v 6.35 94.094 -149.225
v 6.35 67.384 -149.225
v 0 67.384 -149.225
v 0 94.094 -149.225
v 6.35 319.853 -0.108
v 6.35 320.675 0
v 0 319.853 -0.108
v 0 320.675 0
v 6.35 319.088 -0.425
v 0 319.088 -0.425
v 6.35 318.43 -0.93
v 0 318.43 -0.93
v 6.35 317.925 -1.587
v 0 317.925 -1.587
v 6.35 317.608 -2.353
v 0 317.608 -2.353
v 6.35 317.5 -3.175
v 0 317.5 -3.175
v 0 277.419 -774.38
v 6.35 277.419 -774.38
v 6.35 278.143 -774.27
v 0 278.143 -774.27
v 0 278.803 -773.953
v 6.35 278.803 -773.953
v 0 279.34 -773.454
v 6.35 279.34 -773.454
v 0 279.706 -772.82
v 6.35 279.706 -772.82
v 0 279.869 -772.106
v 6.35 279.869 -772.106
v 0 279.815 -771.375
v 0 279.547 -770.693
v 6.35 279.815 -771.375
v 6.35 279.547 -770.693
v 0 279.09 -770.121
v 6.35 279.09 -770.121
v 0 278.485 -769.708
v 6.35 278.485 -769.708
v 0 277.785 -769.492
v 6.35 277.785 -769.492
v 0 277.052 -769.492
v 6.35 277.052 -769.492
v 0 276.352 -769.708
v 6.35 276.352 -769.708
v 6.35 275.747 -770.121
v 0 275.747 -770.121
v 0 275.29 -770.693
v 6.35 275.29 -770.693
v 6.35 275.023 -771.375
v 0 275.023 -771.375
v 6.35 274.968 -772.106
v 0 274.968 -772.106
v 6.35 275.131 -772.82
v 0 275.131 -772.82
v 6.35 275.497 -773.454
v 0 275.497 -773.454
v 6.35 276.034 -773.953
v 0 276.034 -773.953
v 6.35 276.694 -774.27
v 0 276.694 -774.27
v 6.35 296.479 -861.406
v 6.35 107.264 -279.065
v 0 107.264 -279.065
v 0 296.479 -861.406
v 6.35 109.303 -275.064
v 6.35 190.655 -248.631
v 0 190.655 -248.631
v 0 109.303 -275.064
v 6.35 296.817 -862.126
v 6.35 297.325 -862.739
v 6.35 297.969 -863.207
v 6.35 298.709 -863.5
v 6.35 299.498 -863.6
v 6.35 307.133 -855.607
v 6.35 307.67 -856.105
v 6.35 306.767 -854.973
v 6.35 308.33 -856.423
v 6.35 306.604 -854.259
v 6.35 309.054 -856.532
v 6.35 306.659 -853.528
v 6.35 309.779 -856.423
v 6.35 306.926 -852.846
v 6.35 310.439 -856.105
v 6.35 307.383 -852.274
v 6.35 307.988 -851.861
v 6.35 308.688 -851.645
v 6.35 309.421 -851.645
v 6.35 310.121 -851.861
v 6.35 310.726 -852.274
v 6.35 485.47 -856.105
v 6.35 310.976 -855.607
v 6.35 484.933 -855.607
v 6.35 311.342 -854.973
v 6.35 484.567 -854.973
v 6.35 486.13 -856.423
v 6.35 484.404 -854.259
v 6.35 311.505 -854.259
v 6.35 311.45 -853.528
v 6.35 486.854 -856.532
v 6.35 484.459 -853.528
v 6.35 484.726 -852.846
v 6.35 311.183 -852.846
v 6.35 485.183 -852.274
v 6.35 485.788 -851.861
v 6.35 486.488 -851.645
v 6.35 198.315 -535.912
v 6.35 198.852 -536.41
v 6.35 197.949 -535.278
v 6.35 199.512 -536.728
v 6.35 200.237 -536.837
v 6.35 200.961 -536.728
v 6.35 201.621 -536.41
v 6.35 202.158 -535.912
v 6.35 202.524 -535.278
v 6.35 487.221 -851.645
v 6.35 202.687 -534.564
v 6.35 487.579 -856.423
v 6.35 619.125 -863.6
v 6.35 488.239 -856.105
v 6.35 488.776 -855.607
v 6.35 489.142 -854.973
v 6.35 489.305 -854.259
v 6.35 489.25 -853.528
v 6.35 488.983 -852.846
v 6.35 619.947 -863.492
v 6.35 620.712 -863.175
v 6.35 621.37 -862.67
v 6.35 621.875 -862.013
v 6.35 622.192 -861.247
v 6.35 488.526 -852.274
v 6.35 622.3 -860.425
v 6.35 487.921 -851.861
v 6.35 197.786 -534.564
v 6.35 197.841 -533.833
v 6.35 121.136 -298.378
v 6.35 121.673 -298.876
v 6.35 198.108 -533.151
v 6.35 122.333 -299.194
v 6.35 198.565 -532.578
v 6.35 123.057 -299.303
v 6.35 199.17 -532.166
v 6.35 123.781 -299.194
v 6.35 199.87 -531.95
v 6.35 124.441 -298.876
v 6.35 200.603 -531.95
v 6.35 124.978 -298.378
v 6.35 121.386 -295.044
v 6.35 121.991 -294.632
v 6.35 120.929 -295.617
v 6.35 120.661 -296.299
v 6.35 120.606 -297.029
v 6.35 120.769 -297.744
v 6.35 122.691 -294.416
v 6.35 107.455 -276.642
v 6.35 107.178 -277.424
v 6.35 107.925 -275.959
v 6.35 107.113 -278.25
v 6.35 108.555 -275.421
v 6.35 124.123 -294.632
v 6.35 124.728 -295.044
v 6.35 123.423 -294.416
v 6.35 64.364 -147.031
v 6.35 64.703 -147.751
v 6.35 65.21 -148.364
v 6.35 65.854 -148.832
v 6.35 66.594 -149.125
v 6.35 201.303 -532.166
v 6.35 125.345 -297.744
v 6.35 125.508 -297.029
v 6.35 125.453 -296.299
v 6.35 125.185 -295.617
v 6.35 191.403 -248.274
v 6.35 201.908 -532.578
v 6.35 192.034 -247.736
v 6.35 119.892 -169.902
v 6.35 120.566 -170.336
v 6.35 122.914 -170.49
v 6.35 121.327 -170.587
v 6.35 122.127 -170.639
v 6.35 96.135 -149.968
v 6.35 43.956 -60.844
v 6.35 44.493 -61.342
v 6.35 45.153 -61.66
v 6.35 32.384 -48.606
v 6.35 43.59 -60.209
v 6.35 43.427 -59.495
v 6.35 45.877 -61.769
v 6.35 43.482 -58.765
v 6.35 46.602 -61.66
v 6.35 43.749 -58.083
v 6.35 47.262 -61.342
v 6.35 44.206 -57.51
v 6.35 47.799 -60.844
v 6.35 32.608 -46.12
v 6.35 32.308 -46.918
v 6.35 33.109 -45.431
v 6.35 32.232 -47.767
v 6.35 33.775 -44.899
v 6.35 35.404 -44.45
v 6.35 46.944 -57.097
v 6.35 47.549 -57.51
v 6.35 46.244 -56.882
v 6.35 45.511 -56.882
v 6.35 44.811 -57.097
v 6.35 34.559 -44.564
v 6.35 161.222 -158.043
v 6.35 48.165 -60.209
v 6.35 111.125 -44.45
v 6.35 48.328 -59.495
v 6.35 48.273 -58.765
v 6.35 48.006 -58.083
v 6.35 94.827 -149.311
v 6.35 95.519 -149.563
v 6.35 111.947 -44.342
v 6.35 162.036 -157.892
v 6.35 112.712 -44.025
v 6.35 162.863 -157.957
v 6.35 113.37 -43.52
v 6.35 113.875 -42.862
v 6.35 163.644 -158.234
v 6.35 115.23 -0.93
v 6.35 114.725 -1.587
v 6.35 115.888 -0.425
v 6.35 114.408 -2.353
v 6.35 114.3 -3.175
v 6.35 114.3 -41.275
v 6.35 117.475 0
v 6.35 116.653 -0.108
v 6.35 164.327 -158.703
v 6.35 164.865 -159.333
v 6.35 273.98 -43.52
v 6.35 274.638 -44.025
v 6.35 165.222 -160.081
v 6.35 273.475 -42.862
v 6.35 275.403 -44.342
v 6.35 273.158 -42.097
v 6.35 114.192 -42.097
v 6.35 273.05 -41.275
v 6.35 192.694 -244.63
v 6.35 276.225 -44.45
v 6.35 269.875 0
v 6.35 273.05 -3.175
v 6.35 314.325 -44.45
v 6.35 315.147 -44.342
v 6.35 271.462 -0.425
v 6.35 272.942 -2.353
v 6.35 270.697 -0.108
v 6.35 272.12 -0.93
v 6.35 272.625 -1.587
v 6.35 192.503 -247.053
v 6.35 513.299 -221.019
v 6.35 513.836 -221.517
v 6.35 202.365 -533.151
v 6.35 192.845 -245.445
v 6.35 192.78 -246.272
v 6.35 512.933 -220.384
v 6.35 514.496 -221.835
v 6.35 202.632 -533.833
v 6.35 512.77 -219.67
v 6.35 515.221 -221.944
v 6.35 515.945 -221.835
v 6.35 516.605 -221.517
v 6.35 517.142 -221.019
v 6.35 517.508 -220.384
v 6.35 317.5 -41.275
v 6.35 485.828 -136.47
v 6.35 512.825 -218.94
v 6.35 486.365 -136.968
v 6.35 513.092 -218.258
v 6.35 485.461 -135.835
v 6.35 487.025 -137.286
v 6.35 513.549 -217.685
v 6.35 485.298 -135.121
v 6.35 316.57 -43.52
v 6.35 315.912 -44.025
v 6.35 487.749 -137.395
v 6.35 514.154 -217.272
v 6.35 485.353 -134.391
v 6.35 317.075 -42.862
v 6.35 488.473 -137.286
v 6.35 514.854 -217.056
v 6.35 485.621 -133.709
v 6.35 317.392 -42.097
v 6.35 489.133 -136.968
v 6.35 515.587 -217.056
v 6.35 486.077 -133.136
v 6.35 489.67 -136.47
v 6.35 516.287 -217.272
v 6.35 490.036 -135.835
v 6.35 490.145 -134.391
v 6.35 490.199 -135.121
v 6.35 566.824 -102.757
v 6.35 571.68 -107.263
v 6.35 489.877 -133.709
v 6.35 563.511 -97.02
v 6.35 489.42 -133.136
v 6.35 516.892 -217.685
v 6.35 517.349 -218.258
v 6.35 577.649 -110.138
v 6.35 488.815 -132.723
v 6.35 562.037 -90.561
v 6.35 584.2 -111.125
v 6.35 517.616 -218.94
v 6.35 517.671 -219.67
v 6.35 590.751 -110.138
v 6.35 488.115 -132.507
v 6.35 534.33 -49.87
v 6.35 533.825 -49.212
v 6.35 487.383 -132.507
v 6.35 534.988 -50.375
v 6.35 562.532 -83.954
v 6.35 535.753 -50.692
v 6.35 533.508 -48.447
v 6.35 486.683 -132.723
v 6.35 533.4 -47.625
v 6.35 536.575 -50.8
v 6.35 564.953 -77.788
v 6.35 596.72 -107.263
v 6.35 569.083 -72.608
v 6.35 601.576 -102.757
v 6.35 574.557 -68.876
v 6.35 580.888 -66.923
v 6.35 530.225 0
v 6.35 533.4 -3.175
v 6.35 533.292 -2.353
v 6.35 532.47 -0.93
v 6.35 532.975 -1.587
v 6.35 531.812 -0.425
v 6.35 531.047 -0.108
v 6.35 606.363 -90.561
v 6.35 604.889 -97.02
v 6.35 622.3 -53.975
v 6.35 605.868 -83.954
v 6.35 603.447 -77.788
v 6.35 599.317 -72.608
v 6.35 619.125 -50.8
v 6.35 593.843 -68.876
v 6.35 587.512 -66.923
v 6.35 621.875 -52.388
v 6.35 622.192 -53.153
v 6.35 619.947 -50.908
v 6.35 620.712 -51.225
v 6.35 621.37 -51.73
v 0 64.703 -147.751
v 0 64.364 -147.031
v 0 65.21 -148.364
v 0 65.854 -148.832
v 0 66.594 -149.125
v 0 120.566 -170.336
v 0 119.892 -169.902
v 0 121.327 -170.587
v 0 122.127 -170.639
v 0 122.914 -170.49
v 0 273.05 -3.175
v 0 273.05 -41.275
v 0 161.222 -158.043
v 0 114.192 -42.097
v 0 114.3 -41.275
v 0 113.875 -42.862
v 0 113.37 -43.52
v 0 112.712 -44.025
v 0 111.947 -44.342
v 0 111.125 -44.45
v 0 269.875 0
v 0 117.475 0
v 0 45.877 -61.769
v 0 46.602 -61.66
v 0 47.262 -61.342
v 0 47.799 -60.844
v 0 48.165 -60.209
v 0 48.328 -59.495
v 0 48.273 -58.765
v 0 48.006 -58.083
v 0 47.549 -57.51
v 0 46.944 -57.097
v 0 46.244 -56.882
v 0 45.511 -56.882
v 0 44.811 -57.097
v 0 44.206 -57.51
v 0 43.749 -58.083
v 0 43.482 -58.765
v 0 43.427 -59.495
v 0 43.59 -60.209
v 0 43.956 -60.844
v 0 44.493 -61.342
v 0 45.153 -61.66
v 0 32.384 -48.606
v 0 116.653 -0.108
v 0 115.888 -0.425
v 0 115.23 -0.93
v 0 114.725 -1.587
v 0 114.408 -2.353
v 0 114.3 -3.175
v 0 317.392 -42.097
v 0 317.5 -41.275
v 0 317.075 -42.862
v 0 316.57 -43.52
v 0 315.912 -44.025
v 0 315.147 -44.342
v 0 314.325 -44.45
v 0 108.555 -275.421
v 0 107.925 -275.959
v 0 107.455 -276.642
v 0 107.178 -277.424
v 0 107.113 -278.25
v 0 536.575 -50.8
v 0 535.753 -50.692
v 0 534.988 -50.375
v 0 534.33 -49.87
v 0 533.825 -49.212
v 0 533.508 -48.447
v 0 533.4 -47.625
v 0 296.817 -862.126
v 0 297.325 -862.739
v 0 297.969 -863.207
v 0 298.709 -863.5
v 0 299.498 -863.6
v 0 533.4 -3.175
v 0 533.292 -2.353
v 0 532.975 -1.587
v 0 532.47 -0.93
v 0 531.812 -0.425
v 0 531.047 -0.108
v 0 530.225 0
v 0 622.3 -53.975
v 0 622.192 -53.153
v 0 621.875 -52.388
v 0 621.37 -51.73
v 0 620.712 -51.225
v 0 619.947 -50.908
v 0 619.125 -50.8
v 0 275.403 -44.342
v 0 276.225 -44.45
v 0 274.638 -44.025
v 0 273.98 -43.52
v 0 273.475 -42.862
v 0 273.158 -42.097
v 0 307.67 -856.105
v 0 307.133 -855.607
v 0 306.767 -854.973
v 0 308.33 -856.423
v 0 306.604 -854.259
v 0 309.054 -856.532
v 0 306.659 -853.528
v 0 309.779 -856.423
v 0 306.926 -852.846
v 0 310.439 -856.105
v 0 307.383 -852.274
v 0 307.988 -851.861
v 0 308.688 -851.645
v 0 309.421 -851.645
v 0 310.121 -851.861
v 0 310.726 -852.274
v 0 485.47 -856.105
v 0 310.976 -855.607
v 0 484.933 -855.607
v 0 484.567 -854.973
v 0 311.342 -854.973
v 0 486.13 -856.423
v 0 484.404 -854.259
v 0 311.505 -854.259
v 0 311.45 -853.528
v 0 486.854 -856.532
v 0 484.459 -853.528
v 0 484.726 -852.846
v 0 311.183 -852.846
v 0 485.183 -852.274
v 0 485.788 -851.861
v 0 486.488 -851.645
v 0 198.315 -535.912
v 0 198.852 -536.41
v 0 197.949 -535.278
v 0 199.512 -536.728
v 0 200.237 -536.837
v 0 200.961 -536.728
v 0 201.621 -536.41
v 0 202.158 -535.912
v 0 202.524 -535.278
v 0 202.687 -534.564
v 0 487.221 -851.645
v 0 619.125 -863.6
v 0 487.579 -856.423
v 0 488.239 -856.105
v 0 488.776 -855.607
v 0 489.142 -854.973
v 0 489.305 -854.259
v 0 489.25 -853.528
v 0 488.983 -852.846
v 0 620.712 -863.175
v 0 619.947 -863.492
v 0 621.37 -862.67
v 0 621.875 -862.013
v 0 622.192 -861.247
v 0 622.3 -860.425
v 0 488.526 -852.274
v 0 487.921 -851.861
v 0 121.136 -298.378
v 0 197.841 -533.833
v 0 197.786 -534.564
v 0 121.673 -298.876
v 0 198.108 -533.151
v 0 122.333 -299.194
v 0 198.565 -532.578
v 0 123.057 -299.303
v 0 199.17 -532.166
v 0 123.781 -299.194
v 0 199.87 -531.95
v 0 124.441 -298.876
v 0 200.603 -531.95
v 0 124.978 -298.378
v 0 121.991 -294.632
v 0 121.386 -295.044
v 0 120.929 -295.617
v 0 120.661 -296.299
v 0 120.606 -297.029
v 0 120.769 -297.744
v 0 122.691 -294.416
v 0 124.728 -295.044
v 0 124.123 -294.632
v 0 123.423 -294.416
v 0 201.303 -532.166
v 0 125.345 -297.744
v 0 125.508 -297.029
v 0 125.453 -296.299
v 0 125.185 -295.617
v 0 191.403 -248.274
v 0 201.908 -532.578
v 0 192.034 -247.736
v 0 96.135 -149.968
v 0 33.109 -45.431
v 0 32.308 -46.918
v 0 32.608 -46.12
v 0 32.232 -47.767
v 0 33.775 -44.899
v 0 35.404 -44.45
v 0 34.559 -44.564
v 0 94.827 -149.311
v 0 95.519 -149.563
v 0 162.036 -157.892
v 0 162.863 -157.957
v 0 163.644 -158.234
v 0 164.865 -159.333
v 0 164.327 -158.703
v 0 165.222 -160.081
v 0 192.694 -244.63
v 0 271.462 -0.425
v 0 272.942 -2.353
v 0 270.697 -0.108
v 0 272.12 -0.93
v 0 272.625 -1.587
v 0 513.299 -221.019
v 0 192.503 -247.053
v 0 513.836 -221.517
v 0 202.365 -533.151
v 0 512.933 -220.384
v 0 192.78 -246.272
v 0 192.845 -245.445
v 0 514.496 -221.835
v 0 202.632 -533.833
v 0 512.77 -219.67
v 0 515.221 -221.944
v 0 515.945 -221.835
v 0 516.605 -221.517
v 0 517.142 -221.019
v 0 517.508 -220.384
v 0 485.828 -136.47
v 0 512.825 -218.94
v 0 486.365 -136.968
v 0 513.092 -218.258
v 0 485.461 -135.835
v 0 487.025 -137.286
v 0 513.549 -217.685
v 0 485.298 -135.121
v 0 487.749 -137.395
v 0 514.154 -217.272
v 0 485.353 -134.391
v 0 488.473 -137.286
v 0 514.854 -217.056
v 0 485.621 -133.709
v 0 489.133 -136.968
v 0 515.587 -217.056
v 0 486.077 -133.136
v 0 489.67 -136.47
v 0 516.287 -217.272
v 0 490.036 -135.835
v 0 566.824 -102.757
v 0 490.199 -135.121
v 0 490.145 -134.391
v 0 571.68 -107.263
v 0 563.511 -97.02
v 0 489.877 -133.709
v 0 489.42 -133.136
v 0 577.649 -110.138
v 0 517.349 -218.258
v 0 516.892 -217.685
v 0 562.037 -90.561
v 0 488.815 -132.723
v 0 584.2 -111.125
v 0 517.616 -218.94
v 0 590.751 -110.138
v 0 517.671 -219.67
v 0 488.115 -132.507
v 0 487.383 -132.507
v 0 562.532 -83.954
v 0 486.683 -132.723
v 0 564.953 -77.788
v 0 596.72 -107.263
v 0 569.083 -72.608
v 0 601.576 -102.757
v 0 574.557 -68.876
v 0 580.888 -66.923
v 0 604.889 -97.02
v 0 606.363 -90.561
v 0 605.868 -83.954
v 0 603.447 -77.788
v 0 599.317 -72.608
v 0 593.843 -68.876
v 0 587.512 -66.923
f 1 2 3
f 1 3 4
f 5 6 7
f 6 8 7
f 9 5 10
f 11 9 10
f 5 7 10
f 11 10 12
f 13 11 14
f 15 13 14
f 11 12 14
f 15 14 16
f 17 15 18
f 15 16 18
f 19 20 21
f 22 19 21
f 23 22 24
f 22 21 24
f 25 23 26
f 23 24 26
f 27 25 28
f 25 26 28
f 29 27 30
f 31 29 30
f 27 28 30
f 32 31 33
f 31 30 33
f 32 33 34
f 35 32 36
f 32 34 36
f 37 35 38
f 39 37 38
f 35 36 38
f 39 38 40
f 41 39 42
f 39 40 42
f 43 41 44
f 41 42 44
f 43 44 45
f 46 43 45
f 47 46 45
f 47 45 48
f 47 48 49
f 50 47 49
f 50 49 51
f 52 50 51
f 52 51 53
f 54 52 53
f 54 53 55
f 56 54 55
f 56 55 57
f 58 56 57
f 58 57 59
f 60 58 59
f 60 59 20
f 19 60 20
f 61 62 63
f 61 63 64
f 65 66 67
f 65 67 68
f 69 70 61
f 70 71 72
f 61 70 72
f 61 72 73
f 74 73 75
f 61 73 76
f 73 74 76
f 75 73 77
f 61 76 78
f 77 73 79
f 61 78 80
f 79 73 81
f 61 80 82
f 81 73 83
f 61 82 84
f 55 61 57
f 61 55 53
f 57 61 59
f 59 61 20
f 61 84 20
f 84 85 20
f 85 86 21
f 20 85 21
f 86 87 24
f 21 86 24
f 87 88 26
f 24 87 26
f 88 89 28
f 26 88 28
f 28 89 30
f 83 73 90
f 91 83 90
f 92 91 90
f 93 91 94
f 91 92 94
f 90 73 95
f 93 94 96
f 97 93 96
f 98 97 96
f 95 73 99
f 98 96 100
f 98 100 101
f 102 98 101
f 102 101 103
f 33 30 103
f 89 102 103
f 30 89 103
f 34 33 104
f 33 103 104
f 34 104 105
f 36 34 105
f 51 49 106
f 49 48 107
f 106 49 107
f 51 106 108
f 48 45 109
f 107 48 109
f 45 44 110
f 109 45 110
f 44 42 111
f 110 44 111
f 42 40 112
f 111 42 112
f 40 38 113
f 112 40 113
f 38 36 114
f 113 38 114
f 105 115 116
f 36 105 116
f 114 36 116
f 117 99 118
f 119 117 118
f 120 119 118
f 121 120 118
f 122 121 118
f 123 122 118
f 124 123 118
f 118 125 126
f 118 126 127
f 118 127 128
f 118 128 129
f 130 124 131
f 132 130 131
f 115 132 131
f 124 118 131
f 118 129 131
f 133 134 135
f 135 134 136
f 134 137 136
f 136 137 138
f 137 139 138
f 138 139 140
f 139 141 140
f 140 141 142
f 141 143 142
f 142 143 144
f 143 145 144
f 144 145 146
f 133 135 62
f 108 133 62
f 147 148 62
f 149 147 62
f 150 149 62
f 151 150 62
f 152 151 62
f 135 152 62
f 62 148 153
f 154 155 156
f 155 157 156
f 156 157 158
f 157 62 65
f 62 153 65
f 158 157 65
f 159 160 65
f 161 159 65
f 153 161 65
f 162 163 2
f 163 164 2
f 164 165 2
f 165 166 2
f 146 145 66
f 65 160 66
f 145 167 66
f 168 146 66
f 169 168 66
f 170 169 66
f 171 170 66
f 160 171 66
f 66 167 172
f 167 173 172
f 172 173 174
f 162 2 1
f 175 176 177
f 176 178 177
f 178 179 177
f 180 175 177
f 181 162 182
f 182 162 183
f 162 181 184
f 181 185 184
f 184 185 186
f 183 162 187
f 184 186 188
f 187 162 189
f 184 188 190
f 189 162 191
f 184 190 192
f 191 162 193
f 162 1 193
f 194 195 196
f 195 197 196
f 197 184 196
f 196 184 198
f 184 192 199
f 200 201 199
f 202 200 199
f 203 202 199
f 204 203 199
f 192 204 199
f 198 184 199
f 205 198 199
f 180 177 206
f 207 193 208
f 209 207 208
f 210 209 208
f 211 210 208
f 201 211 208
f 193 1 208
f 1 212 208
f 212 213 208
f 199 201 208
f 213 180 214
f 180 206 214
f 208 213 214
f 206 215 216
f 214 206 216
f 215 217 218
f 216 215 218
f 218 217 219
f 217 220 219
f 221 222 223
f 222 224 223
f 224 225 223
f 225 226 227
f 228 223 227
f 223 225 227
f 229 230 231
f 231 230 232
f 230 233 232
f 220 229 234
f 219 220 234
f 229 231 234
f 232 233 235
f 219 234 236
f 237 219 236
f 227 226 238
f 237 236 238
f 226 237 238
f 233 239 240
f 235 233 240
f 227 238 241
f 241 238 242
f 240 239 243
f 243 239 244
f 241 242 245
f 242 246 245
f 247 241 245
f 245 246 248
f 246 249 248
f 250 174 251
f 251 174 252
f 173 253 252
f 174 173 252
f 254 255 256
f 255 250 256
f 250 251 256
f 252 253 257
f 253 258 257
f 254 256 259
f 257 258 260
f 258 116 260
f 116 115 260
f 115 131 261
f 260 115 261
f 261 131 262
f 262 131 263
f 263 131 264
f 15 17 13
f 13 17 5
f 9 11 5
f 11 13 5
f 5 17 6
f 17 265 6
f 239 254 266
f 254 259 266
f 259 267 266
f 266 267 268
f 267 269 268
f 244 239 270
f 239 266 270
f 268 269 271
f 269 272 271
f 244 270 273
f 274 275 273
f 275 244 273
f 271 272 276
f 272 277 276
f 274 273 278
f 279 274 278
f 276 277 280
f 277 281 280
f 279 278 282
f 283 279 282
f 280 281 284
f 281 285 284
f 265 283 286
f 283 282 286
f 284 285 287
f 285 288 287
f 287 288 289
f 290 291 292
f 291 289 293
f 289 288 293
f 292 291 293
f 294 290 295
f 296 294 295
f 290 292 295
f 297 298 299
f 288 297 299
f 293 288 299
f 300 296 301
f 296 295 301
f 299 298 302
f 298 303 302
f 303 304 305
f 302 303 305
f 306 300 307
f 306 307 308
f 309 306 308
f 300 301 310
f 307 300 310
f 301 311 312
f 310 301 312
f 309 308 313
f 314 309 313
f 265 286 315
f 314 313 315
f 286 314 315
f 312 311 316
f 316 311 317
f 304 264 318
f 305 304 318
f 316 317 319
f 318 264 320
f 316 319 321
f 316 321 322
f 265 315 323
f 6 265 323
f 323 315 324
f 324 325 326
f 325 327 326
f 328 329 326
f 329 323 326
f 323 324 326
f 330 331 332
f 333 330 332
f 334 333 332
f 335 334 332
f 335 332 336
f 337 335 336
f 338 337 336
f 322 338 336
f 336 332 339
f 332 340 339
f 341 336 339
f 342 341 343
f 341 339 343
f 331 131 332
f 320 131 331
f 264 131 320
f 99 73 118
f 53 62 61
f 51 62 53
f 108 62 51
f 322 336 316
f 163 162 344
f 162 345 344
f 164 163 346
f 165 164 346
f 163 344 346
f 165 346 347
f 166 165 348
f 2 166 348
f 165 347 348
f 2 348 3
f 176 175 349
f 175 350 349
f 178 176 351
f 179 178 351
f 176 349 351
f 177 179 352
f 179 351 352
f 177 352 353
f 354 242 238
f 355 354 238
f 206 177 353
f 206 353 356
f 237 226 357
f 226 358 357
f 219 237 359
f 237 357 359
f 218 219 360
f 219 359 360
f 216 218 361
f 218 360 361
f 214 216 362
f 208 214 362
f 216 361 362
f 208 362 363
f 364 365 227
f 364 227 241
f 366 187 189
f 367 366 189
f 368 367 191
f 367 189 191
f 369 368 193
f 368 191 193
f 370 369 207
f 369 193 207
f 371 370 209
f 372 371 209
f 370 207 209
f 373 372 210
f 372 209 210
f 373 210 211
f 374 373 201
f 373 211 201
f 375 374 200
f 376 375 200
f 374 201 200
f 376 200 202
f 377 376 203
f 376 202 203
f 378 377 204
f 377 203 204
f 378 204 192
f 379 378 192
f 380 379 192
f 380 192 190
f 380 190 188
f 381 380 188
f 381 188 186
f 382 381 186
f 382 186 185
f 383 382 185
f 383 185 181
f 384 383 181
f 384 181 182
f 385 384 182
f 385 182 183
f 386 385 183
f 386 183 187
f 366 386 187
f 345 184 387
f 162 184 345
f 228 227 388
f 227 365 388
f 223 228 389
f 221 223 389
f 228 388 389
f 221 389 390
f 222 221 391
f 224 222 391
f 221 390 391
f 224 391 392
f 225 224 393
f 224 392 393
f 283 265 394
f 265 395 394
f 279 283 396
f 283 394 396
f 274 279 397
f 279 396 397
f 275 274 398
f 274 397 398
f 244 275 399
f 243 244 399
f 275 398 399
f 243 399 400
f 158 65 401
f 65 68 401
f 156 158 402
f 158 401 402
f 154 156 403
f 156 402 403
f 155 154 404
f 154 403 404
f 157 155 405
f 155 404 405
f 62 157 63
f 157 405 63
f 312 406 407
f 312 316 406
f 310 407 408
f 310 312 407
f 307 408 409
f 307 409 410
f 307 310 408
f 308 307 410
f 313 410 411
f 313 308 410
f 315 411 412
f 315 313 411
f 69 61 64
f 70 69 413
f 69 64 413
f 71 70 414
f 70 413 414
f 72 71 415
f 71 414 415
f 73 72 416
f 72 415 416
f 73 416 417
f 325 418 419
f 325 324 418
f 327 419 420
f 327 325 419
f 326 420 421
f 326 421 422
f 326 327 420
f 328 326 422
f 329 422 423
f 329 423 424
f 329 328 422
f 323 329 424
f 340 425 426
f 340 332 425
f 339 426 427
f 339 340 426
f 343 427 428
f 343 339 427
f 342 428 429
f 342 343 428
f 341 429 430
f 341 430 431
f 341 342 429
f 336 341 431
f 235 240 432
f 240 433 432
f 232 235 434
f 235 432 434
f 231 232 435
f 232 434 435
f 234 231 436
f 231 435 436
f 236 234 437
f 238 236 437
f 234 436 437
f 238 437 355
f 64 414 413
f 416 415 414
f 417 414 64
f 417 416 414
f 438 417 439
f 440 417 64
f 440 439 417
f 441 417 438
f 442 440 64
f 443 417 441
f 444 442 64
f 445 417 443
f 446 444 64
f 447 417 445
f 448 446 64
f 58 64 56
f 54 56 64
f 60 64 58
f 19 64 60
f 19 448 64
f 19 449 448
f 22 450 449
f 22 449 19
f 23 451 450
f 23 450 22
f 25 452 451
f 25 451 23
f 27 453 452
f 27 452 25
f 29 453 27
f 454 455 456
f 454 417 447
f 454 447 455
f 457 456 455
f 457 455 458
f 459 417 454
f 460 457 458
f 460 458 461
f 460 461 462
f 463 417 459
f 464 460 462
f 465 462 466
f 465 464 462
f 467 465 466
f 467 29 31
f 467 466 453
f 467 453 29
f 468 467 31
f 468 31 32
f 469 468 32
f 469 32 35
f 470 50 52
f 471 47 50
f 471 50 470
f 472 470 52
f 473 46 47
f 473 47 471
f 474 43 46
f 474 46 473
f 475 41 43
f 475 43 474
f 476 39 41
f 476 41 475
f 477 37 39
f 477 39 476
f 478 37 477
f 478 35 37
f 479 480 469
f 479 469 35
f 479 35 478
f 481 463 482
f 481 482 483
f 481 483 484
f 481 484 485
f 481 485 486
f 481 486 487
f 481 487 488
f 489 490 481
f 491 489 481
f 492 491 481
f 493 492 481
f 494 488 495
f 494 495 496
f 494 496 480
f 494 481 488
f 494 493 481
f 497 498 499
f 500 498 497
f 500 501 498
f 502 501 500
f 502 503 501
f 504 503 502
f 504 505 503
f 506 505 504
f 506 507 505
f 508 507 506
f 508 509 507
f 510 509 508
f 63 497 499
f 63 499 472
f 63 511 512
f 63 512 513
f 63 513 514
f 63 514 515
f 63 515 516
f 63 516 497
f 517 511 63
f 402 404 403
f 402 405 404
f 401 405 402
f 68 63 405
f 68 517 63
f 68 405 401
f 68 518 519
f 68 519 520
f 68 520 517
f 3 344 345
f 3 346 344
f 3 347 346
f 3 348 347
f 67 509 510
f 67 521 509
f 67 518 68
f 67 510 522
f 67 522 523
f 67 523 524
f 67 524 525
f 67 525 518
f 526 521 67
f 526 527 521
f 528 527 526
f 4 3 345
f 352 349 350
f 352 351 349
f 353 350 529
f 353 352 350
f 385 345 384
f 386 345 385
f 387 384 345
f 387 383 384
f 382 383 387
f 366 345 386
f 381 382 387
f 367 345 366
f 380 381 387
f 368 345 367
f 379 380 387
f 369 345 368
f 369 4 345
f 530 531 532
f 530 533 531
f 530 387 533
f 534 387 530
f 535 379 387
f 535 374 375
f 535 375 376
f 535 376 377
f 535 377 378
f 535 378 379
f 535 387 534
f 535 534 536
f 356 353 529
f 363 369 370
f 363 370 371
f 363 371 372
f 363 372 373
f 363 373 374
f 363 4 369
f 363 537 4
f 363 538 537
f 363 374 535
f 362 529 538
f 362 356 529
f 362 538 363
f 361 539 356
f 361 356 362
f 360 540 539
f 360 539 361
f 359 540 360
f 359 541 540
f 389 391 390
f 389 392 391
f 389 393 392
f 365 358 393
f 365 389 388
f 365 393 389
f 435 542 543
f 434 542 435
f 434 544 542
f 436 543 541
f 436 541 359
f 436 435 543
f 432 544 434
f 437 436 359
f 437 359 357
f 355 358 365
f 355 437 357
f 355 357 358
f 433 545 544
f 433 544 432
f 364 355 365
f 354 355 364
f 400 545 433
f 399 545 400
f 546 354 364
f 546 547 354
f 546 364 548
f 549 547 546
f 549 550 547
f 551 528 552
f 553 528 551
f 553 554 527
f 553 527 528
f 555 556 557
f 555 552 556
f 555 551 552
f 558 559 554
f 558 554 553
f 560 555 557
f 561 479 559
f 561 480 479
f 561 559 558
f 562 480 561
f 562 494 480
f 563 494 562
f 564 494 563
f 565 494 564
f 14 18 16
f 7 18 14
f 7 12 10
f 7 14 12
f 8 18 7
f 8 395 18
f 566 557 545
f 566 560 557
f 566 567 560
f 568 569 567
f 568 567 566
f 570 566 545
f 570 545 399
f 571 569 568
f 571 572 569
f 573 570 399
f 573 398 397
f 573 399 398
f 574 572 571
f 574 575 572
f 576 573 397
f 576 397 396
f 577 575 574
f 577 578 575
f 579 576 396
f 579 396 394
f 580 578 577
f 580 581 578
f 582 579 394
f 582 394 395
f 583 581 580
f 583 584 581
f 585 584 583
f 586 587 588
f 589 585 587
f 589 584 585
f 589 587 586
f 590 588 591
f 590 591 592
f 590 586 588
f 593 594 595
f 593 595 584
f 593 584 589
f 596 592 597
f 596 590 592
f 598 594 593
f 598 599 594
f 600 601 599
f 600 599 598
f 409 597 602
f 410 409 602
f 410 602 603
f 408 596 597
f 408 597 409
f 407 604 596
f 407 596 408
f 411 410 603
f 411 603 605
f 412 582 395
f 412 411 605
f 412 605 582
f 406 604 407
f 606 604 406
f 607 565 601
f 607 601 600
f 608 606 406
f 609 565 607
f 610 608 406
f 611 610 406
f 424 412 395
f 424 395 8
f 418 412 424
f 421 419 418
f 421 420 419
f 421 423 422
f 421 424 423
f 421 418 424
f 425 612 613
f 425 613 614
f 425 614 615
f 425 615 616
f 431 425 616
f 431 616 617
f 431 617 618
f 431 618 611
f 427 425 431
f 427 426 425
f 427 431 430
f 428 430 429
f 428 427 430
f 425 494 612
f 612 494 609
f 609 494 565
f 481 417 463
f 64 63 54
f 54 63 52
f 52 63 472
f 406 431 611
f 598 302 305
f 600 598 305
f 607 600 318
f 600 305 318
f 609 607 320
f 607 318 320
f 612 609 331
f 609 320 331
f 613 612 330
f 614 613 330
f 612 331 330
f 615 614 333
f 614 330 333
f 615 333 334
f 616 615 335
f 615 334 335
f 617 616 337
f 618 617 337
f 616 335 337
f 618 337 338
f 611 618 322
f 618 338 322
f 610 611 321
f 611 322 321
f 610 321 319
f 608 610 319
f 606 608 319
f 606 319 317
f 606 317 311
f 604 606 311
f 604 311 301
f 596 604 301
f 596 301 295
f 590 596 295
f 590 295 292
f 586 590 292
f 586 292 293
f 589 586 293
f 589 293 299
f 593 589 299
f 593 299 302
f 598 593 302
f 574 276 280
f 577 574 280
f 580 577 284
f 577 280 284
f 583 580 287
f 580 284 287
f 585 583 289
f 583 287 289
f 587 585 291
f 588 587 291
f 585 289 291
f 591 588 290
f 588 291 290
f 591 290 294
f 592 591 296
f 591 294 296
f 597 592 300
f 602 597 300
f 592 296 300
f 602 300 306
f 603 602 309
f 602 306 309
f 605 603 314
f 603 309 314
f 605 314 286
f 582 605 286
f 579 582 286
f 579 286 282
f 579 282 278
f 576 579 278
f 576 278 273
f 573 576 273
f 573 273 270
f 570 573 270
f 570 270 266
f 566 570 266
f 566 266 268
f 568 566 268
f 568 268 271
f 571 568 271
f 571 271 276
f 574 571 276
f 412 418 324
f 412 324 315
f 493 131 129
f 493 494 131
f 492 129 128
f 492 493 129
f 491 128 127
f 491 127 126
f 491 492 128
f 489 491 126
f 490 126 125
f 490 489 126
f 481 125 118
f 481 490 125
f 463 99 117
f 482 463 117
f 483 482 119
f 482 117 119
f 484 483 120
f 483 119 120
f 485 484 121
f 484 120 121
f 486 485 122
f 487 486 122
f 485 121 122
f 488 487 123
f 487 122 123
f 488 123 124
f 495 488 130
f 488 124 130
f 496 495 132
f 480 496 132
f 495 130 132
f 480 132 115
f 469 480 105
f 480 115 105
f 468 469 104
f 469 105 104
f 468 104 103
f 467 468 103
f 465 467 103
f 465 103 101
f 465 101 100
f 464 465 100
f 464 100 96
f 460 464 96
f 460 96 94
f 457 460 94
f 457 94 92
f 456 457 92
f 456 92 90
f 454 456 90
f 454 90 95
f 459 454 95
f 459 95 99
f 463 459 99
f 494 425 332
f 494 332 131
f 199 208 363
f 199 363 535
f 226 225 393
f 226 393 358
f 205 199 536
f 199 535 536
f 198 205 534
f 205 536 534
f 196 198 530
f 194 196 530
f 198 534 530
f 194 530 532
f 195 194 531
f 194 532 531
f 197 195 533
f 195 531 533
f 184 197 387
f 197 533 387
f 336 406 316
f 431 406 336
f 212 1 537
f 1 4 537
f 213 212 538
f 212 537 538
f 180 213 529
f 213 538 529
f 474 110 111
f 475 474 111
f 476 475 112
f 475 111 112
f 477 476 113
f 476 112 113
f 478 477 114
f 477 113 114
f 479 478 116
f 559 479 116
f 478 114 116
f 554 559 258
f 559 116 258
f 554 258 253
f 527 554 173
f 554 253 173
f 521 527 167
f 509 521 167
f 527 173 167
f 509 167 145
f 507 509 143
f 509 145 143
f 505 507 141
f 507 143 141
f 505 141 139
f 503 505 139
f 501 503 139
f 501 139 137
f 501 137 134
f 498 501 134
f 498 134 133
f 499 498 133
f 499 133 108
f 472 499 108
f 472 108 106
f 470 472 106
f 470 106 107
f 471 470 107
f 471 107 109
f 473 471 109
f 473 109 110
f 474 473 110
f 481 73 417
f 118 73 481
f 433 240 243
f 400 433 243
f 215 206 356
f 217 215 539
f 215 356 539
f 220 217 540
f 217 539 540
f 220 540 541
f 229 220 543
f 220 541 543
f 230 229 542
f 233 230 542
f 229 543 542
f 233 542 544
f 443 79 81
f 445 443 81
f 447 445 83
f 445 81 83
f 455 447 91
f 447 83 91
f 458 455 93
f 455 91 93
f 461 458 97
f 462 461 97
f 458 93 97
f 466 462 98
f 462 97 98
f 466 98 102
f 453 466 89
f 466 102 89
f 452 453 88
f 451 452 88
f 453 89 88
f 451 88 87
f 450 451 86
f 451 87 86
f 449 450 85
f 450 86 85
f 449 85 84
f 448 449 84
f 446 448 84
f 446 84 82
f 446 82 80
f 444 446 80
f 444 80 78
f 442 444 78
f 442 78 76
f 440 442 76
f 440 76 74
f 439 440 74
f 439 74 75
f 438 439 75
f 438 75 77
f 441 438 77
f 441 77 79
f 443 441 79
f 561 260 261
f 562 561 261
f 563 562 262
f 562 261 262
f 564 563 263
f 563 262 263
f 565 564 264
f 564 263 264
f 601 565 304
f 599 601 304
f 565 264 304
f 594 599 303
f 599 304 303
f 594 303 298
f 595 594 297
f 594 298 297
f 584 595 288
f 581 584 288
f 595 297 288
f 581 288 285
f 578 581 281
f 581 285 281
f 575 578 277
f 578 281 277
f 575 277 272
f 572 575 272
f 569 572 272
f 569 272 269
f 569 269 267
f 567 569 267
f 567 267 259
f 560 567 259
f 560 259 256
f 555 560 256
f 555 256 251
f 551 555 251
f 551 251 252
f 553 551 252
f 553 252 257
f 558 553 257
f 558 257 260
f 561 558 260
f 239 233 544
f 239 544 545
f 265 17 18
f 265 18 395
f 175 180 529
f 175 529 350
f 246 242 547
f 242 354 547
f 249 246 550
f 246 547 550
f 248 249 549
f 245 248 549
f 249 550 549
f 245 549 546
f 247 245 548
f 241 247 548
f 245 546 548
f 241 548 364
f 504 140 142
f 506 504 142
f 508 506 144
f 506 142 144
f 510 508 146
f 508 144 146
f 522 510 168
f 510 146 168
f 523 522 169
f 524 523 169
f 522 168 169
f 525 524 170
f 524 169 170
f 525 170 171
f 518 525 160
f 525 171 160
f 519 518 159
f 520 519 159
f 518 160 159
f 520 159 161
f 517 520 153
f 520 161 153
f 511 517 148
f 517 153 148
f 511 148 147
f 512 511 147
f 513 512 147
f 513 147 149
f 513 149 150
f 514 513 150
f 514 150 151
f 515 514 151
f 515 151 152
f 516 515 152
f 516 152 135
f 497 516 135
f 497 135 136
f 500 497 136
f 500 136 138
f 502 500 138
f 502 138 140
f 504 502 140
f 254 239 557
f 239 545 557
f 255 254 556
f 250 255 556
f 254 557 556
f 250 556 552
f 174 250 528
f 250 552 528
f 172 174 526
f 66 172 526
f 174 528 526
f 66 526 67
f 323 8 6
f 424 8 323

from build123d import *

# Parameters (mm, degrees)
BOSS_EXTRUDE1_DEPTH = 6.35
SKETCH2_R           = 2.45745
SKETCH2_R_2         = 22.225
SKETCH2_W           = 44.45
SKETCH2_H           = 44.45
CUT_EXTRUDE1_DEPTH  = 1236.054594947
FILLET1_R           = 3.175


with BuildPart() as part:
    # Sketch1 → Boss-Extrude1 (new body)
    with BuildSketch(Plane(origin=(0, 0, 0), x_dir=(0, 0, -1), z_dir=(1, 0, 0))):
        Polygon((1016, 533.4), (1066.8, 533.4), (1066.8, 0), (0, 0), (0, 533.4), (50.8, 533.4), (50.8, 622.3), (1016, 622.3), align=None)
    extrude(amount=BOSS_EXTRUDE1_DEPTH)

    # Sketch2 → Cut-Extrude1 (cut, through all)
    with BuildSketch(Plane(origin=(6.35, 0, 0), x_dir=(0, 0, -1), z_dir=(1, 0, 0))):
        with Locations((59.31154, 45.87748)):
            Circle(SKETCH2_R)
        with Locations((296.845703608, 123.057008284)):
            Circle(SKETCH2_R)
        with Locations((534.379867216, 200.236536569)):
            Circle(SKETCH2_R)
        with Locations((771.922083103, 277.418681197)):
            Circle(SKETCH2_R)
        with Locations((854.075, 309.0545)):
            Circle(SKETCH2_R)
        with Locations((854.075, 486.8545)):
            Circle(SKETCH2_R)
        with Locations((219.486424299, 515.220524995)):
            Circle(SKETCH2_R)
        with Locations((134.9375, 487.748914195)):
            Circle(SKETCH2_R)
        with Locations((88.9, 584.2)):
            Circle(SKETCH2_R_2)
        Polygon((149.225, 95.25), (171.033618902, 121.240499926), (157.061866823, 164.241131286), (247.65, 193.675), (276.045265579, 106.283358593), (863.6, 297.191464421), (863.6, 622.3), (1016, 622.3), (1016, 533.4), (1066.8, 533.4), (1066.8, 0), (0, 0), (0, 114.3), (44.45, 114.3), (44.45, 31.033495252), (149.225, 65.076956425), align=None)
        with Locations((22.225, 295.275)):
            Rectangle(SKETCH2_W, SKETCH2_H)
    extrude(amount=-CUT_EXTRUDE1_DEPTH, mode=Mode.SUBTRACT)

    # Fillet1
    fillet1_edges = [part.edges().sort_by_distance(p)[0] for p in [
        (3.175, 533.4, 0),
        (3.175, 533.4, -50.8),
        (3.175, 622.3, -50.8),
        (3.175, 273.05, 0),
        (3.175, 317.5, 0),
        (3.175, 317.5, -44.45),
        (3.175, 273.05, -44.45),
        (3.175, 114.3, 0),
        (3.175, 114.3, -44.45),
        (3.175, 31.033495252, -44.45),
        (3.175, 65.076956425, -149.225),
        (3.175, 95.25, -149.225),
        (3.175, 121.240499926, -171.033618902),
        (3.175, 164.241131286, -157.061866823),
        (3.175, 193.675, -247.65),
        (3.175, 106.283358593, -276.045265579),
        (3.175, 297.191464421, -863.6),
        (3.175, 622.3, -863.6),
    ]]
    fillet(fillet1_edges, radius=FILLET1_R)


solid = part.part
